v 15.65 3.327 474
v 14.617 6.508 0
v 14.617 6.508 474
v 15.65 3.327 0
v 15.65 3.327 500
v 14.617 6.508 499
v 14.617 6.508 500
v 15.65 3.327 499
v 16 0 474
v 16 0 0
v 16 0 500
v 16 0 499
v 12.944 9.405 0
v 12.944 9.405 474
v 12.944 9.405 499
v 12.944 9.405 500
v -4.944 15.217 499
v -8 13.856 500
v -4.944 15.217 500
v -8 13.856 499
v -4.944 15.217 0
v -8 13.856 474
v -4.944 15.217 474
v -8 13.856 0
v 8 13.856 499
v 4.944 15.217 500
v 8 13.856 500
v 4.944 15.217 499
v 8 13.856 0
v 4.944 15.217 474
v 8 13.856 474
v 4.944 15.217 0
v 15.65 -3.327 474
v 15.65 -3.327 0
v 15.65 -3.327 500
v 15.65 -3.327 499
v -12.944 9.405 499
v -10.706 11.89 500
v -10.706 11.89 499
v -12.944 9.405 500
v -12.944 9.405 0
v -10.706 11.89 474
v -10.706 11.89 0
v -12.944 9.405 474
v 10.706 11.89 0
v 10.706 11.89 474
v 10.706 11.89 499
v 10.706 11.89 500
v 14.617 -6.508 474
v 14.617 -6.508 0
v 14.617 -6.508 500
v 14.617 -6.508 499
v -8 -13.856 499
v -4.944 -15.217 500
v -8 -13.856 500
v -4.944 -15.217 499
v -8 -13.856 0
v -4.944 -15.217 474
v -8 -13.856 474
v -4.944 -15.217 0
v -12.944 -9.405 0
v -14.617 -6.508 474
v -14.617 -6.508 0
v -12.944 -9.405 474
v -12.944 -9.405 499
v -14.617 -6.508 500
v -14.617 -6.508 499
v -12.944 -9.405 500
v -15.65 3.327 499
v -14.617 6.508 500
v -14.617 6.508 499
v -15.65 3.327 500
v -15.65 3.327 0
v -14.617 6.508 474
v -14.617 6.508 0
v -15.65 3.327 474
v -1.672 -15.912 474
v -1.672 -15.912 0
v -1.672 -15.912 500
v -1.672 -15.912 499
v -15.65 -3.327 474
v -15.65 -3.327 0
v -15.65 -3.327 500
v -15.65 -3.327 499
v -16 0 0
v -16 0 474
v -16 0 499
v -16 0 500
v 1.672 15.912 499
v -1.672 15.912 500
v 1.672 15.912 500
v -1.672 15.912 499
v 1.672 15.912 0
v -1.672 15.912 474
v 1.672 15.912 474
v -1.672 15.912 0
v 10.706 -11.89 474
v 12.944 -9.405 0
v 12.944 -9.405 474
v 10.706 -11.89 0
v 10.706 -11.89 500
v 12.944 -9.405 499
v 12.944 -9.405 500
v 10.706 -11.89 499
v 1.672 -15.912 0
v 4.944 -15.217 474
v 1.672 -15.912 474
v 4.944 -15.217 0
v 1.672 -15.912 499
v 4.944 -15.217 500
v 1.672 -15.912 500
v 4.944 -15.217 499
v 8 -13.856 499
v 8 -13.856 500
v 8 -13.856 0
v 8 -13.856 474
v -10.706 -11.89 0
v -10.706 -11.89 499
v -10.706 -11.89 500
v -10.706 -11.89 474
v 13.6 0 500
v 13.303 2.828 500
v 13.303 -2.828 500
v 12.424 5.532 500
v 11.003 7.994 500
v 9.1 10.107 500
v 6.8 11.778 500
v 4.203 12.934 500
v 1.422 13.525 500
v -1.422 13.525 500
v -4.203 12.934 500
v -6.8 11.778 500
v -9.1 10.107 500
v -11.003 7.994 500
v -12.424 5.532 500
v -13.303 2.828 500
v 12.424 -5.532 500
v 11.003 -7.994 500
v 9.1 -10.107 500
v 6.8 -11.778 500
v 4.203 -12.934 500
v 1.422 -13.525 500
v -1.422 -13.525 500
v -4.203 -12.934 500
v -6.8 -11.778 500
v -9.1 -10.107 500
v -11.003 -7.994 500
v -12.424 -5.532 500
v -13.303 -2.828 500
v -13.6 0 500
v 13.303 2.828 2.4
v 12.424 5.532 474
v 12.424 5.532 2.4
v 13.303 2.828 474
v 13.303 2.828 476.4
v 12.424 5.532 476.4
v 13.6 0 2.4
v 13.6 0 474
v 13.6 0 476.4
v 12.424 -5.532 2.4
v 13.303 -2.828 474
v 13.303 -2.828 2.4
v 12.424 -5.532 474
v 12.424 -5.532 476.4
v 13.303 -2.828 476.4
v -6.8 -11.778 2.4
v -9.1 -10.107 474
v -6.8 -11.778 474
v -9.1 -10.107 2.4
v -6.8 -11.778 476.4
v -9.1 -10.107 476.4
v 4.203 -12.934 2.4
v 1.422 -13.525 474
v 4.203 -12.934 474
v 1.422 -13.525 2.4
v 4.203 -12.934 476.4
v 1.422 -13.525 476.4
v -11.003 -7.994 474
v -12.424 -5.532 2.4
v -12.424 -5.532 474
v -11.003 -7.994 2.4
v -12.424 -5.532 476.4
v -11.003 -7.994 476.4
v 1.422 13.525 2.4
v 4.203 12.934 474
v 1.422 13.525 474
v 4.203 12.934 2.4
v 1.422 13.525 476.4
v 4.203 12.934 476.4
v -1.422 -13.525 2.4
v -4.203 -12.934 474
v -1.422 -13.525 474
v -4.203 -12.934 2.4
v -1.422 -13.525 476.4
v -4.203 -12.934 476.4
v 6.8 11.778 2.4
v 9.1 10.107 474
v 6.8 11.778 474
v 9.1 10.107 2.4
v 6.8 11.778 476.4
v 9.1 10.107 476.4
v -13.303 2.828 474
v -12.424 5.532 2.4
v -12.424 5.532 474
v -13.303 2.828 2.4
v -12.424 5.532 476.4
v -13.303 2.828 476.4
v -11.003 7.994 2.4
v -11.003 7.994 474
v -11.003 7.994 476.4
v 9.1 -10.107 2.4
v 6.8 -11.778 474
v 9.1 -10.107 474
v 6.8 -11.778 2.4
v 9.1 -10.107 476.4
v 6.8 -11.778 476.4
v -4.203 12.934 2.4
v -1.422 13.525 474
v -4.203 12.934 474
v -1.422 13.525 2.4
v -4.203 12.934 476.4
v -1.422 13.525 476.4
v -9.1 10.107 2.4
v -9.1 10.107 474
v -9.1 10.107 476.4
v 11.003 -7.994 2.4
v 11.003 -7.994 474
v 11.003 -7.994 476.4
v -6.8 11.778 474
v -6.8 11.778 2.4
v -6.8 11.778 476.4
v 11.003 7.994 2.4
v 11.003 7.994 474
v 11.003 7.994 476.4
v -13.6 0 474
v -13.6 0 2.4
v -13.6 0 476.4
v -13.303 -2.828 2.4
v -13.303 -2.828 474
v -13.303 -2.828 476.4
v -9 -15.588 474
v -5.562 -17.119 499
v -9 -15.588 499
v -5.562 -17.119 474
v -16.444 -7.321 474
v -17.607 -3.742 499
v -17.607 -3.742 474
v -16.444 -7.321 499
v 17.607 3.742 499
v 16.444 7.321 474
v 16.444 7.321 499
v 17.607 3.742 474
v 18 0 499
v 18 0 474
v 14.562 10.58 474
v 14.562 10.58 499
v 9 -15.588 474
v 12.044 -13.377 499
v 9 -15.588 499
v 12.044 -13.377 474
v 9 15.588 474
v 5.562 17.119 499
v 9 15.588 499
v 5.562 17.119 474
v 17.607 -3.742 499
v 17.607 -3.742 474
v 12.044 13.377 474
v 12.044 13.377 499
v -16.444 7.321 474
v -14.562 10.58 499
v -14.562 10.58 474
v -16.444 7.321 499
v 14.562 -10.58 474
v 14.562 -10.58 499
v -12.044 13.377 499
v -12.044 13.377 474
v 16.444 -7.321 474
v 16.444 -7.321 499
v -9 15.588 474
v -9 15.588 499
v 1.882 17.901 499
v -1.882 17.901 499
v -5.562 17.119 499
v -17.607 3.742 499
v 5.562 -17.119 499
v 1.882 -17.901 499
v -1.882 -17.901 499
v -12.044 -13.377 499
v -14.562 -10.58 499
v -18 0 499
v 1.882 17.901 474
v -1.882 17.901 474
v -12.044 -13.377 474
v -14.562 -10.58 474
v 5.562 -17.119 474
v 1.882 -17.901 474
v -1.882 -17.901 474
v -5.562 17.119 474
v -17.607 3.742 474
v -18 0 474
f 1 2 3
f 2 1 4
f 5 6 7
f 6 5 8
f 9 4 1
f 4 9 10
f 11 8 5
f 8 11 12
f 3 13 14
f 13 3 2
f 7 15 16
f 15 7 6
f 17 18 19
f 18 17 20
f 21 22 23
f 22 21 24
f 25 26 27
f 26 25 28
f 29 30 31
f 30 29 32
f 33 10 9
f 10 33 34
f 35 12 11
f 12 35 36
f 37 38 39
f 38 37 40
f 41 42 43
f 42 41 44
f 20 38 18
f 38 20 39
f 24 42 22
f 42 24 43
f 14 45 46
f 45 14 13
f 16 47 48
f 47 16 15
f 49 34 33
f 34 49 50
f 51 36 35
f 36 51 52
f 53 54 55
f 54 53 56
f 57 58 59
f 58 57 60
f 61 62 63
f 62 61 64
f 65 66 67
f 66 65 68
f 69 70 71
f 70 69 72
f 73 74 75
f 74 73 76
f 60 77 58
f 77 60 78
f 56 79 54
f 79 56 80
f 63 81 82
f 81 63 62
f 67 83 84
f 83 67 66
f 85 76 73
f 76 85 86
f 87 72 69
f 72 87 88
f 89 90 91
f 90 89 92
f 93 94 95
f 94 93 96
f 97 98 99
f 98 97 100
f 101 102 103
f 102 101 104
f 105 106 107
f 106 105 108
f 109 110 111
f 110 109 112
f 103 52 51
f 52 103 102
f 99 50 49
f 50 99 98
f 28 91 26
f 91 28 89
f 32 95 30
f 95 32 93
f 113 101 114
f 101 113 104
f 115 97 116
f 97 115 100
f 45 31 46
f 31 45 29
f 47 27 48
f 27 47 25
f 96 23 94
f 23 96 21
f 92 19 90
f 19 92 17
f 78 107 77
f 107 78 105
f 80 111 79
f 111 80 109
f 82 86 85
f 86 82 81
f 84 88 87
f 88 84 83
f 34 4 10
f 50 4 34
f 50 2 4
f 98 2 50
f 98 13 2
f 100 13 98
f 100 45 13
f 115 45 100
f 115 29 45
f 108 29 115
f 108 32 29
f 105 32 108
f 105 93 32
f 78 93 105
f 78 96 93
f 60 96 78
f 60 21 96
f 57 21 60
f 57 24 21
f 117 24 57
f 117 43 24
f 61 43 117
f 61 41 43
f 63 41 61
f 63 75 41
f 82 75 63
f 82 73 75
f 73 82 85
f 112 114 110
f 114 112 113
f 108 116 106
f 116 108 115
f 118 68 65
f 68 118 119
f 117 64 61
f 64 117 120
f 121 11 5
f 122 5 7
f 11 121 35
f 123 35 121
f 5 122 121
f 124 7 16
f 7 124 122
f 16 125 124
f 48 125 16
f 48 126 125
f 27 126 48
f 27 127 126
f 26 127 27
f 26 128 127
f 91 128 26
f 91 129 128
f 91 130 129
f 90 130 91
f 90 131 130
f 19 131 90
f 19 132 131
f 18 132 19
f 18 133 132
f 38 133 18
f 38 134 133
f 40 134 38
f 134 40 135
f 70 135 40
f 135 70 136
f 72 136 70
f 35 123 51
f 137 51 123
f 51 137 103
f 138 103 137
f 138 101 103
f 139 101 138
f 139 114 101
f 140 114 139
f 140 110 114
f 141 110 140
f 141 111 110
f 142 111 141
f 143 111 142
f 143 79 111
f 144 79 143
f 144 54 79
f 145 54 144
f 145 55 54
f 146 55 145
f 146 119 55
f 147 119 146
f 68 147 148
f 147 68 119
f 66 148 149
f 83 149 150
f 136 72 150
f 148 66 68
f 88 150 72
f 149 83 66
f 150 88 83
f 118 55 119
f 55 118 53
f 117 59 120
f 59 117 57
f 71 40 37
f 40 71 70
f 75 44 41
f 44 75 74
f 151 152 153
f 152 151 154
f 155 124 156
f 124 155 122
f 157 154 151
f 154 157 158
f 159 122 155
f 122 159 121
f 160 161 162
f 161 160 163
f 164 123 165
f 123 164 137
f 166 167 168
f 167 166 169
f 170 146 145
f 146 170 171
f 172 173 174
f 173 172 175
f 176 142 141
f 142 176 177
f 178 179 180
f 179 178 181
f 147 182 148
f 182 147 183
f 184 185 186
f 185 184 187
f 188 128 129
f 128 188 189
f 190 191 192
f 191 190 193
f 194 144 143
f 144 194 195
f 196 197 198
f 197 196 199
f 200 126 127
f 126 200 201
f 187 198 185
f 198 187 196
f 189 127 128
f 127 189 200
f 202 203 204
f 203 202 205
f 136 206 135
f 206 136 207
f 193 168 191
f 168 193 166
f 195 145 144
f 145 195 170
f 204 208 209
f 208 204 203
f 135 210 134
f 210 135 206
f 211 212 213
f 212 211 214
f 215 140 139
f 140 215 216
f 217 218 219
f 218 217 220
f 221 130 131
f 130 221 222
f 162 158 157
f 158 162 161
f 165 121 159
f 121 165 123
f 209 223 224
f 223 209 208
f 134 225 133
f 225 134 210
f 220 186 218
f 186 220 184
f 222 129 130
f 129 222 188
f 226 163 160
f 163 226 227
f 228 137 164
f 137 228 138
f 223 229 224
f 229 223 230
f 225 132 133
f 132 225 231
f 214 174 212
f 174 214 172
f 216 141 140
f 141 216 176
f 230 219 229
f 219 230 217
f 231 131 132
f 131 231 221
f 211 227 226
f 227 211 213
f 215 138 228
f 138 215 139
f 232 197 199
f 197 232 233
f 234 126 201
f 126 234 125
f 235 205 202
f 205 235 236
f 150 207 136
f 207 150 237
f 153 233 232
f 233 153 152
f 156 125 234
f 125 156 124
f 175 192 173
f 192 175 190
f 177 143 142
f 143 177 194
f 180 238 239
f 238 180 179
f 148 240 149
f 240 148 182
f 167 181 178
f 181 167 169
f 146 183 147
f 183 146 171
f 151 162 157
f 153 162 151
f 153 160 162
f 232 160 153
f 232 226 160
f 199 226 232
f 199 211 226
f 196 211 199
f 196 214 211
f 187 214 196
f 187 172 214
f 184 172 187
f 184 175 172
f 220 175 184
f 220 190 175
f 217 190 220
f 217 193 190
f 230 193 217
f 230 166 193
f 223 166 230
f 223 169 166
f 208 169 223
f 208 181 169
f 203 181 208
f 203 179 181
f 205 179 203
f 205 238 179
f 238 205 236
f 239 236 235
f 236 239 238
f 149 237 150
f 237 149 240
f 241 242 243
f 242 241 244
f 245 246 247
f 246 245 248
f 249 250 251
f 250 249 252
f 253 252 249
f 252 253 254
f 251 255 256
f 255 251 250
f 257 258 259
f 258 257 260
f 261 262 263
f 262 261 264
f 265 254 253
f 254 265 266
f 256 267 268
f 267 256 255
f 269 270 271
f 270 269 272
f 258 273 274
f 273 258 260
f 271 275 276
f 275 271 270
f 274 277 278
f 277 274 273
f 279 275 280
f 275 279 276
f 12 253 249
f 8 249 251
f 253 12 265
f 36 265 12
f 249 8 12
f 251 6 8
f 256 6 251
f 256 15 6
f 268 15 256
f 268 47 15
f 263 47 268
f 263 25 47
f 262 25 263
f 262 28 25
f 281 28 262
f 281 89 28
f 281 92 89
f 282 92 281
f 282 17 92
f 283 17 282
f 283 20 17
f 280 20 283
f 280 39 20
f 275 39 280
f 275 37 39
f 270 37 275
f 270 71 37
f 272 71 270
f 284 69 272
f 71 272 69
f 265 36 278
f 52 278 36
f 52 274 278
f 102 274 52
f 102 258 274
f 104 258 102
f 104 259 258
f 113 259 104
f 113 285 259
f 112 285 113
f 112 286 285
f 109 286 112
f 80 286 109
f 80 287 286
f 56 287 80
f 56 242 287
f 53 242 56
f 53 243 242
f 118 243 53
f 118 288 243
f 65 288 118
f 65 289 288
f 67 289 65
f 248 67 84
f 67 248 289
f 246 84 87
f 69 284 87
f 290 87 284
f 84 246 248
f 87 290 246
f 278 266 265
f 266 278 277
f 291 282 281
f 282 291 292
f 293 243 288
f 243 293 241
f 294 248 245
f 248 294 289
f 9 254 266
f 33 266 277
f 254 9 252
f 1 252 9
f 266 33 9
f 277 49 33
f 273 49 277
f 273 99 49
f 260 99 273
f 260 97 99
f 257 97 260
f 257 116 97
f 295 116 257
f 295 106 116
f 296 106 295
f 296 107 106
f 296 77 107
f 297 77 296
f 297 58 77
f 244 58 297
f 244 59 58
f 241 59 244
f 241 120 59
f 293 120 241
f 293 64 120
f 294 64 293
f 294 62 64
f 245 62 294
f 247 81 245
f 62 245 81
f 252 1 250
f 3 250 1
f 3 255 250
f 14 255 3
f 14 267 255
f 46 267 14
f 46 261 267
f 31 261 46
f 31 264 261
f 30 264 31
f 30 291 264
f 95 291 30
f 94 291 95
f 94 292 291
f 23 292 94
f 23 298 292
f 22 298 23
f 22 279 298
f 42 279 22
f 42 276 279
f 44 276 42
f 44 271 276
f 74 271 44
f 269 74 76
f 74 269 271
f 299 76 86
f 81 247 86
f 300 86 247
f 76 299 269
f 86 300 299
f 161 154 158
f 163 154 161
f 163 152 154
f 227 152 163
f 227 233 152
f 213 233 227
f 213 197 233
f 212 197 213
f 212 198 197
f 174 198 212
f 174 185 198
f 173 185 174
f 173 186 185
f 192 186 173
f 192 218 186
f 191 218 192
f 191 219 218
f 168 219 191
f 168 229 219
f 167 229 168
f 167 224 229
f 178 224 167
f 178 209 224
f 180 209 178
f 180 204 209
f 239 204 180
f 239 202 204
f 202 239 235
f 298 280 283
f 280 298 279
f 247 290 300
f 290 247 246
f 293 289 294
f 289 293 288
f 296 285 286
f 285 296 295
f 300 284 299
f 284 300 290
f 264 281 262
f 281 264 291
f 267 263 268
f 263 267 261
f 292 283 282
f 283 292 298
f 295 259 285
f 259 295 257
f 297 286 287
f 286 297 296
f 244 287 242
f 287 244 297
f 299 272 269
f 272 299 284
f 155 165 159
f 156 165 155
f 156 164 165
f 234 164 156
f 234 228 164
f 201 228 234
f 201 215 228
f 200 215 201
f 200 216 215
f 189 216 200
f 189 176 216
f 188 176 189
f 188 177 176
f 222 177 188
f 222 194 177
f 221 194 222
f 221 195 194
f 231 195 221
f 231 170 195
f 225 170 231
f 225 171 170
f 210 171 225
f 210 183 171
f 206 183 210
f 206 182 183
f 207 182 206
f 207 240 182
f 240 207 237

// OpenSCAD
// Parameters
pipe_standard = 1; //[1:1:1]
nominal_diameter_mm = 32; //[16:64:1]
length_mm = 500; //[250:1000:1]
wall_thickness_mm = 2.4; //[1.2:4.8:0.1]
fitting_length_mm = 25; //[12.5:50:0.5]
fitting_radial_thickness_mm = 2.0; //[1.0:4.0:0.1]
overlap_mm = 1.0; //[0.5:2.0:0.1]

// HT Pipe Segment - Complete Geometry
module ht_pipe() {
  color([0.85, 0.85, 0.8]) { // PVC color
    union() {
      // Main pipe segment
      difference() {
        cylinder(h=length_mm, r=nominal_diameter_mm/2, center=false);
        translate([0, 0, wall_thickness_mm])
          cylinder(h=length_mm, r=nominal_diameter_mm/2 - wall_thickness_mm, center=false);
      }
      
      // End fitting geometry
      difference() {
        translate([0, 0, length_mm - fitting_length_mm - overlap_mm])
          cylinder(h=fitting_length_mm, r=nominal_diameter_mm/2 + fitting_radial_thickness_mm, center=false);
        translate([0, 0, length_mm - fitting_length_mm - overlap_mm + wall_thickness_mm])
          cylinder(h=fitting_length_mm + overlap_mm, r=nominal_diameter_mm/2 - wall_thickness_mm, center=false);
      }
    }
  }
}

// Assembly
module assembly() {
  ht_pipe();
}

assembly();
